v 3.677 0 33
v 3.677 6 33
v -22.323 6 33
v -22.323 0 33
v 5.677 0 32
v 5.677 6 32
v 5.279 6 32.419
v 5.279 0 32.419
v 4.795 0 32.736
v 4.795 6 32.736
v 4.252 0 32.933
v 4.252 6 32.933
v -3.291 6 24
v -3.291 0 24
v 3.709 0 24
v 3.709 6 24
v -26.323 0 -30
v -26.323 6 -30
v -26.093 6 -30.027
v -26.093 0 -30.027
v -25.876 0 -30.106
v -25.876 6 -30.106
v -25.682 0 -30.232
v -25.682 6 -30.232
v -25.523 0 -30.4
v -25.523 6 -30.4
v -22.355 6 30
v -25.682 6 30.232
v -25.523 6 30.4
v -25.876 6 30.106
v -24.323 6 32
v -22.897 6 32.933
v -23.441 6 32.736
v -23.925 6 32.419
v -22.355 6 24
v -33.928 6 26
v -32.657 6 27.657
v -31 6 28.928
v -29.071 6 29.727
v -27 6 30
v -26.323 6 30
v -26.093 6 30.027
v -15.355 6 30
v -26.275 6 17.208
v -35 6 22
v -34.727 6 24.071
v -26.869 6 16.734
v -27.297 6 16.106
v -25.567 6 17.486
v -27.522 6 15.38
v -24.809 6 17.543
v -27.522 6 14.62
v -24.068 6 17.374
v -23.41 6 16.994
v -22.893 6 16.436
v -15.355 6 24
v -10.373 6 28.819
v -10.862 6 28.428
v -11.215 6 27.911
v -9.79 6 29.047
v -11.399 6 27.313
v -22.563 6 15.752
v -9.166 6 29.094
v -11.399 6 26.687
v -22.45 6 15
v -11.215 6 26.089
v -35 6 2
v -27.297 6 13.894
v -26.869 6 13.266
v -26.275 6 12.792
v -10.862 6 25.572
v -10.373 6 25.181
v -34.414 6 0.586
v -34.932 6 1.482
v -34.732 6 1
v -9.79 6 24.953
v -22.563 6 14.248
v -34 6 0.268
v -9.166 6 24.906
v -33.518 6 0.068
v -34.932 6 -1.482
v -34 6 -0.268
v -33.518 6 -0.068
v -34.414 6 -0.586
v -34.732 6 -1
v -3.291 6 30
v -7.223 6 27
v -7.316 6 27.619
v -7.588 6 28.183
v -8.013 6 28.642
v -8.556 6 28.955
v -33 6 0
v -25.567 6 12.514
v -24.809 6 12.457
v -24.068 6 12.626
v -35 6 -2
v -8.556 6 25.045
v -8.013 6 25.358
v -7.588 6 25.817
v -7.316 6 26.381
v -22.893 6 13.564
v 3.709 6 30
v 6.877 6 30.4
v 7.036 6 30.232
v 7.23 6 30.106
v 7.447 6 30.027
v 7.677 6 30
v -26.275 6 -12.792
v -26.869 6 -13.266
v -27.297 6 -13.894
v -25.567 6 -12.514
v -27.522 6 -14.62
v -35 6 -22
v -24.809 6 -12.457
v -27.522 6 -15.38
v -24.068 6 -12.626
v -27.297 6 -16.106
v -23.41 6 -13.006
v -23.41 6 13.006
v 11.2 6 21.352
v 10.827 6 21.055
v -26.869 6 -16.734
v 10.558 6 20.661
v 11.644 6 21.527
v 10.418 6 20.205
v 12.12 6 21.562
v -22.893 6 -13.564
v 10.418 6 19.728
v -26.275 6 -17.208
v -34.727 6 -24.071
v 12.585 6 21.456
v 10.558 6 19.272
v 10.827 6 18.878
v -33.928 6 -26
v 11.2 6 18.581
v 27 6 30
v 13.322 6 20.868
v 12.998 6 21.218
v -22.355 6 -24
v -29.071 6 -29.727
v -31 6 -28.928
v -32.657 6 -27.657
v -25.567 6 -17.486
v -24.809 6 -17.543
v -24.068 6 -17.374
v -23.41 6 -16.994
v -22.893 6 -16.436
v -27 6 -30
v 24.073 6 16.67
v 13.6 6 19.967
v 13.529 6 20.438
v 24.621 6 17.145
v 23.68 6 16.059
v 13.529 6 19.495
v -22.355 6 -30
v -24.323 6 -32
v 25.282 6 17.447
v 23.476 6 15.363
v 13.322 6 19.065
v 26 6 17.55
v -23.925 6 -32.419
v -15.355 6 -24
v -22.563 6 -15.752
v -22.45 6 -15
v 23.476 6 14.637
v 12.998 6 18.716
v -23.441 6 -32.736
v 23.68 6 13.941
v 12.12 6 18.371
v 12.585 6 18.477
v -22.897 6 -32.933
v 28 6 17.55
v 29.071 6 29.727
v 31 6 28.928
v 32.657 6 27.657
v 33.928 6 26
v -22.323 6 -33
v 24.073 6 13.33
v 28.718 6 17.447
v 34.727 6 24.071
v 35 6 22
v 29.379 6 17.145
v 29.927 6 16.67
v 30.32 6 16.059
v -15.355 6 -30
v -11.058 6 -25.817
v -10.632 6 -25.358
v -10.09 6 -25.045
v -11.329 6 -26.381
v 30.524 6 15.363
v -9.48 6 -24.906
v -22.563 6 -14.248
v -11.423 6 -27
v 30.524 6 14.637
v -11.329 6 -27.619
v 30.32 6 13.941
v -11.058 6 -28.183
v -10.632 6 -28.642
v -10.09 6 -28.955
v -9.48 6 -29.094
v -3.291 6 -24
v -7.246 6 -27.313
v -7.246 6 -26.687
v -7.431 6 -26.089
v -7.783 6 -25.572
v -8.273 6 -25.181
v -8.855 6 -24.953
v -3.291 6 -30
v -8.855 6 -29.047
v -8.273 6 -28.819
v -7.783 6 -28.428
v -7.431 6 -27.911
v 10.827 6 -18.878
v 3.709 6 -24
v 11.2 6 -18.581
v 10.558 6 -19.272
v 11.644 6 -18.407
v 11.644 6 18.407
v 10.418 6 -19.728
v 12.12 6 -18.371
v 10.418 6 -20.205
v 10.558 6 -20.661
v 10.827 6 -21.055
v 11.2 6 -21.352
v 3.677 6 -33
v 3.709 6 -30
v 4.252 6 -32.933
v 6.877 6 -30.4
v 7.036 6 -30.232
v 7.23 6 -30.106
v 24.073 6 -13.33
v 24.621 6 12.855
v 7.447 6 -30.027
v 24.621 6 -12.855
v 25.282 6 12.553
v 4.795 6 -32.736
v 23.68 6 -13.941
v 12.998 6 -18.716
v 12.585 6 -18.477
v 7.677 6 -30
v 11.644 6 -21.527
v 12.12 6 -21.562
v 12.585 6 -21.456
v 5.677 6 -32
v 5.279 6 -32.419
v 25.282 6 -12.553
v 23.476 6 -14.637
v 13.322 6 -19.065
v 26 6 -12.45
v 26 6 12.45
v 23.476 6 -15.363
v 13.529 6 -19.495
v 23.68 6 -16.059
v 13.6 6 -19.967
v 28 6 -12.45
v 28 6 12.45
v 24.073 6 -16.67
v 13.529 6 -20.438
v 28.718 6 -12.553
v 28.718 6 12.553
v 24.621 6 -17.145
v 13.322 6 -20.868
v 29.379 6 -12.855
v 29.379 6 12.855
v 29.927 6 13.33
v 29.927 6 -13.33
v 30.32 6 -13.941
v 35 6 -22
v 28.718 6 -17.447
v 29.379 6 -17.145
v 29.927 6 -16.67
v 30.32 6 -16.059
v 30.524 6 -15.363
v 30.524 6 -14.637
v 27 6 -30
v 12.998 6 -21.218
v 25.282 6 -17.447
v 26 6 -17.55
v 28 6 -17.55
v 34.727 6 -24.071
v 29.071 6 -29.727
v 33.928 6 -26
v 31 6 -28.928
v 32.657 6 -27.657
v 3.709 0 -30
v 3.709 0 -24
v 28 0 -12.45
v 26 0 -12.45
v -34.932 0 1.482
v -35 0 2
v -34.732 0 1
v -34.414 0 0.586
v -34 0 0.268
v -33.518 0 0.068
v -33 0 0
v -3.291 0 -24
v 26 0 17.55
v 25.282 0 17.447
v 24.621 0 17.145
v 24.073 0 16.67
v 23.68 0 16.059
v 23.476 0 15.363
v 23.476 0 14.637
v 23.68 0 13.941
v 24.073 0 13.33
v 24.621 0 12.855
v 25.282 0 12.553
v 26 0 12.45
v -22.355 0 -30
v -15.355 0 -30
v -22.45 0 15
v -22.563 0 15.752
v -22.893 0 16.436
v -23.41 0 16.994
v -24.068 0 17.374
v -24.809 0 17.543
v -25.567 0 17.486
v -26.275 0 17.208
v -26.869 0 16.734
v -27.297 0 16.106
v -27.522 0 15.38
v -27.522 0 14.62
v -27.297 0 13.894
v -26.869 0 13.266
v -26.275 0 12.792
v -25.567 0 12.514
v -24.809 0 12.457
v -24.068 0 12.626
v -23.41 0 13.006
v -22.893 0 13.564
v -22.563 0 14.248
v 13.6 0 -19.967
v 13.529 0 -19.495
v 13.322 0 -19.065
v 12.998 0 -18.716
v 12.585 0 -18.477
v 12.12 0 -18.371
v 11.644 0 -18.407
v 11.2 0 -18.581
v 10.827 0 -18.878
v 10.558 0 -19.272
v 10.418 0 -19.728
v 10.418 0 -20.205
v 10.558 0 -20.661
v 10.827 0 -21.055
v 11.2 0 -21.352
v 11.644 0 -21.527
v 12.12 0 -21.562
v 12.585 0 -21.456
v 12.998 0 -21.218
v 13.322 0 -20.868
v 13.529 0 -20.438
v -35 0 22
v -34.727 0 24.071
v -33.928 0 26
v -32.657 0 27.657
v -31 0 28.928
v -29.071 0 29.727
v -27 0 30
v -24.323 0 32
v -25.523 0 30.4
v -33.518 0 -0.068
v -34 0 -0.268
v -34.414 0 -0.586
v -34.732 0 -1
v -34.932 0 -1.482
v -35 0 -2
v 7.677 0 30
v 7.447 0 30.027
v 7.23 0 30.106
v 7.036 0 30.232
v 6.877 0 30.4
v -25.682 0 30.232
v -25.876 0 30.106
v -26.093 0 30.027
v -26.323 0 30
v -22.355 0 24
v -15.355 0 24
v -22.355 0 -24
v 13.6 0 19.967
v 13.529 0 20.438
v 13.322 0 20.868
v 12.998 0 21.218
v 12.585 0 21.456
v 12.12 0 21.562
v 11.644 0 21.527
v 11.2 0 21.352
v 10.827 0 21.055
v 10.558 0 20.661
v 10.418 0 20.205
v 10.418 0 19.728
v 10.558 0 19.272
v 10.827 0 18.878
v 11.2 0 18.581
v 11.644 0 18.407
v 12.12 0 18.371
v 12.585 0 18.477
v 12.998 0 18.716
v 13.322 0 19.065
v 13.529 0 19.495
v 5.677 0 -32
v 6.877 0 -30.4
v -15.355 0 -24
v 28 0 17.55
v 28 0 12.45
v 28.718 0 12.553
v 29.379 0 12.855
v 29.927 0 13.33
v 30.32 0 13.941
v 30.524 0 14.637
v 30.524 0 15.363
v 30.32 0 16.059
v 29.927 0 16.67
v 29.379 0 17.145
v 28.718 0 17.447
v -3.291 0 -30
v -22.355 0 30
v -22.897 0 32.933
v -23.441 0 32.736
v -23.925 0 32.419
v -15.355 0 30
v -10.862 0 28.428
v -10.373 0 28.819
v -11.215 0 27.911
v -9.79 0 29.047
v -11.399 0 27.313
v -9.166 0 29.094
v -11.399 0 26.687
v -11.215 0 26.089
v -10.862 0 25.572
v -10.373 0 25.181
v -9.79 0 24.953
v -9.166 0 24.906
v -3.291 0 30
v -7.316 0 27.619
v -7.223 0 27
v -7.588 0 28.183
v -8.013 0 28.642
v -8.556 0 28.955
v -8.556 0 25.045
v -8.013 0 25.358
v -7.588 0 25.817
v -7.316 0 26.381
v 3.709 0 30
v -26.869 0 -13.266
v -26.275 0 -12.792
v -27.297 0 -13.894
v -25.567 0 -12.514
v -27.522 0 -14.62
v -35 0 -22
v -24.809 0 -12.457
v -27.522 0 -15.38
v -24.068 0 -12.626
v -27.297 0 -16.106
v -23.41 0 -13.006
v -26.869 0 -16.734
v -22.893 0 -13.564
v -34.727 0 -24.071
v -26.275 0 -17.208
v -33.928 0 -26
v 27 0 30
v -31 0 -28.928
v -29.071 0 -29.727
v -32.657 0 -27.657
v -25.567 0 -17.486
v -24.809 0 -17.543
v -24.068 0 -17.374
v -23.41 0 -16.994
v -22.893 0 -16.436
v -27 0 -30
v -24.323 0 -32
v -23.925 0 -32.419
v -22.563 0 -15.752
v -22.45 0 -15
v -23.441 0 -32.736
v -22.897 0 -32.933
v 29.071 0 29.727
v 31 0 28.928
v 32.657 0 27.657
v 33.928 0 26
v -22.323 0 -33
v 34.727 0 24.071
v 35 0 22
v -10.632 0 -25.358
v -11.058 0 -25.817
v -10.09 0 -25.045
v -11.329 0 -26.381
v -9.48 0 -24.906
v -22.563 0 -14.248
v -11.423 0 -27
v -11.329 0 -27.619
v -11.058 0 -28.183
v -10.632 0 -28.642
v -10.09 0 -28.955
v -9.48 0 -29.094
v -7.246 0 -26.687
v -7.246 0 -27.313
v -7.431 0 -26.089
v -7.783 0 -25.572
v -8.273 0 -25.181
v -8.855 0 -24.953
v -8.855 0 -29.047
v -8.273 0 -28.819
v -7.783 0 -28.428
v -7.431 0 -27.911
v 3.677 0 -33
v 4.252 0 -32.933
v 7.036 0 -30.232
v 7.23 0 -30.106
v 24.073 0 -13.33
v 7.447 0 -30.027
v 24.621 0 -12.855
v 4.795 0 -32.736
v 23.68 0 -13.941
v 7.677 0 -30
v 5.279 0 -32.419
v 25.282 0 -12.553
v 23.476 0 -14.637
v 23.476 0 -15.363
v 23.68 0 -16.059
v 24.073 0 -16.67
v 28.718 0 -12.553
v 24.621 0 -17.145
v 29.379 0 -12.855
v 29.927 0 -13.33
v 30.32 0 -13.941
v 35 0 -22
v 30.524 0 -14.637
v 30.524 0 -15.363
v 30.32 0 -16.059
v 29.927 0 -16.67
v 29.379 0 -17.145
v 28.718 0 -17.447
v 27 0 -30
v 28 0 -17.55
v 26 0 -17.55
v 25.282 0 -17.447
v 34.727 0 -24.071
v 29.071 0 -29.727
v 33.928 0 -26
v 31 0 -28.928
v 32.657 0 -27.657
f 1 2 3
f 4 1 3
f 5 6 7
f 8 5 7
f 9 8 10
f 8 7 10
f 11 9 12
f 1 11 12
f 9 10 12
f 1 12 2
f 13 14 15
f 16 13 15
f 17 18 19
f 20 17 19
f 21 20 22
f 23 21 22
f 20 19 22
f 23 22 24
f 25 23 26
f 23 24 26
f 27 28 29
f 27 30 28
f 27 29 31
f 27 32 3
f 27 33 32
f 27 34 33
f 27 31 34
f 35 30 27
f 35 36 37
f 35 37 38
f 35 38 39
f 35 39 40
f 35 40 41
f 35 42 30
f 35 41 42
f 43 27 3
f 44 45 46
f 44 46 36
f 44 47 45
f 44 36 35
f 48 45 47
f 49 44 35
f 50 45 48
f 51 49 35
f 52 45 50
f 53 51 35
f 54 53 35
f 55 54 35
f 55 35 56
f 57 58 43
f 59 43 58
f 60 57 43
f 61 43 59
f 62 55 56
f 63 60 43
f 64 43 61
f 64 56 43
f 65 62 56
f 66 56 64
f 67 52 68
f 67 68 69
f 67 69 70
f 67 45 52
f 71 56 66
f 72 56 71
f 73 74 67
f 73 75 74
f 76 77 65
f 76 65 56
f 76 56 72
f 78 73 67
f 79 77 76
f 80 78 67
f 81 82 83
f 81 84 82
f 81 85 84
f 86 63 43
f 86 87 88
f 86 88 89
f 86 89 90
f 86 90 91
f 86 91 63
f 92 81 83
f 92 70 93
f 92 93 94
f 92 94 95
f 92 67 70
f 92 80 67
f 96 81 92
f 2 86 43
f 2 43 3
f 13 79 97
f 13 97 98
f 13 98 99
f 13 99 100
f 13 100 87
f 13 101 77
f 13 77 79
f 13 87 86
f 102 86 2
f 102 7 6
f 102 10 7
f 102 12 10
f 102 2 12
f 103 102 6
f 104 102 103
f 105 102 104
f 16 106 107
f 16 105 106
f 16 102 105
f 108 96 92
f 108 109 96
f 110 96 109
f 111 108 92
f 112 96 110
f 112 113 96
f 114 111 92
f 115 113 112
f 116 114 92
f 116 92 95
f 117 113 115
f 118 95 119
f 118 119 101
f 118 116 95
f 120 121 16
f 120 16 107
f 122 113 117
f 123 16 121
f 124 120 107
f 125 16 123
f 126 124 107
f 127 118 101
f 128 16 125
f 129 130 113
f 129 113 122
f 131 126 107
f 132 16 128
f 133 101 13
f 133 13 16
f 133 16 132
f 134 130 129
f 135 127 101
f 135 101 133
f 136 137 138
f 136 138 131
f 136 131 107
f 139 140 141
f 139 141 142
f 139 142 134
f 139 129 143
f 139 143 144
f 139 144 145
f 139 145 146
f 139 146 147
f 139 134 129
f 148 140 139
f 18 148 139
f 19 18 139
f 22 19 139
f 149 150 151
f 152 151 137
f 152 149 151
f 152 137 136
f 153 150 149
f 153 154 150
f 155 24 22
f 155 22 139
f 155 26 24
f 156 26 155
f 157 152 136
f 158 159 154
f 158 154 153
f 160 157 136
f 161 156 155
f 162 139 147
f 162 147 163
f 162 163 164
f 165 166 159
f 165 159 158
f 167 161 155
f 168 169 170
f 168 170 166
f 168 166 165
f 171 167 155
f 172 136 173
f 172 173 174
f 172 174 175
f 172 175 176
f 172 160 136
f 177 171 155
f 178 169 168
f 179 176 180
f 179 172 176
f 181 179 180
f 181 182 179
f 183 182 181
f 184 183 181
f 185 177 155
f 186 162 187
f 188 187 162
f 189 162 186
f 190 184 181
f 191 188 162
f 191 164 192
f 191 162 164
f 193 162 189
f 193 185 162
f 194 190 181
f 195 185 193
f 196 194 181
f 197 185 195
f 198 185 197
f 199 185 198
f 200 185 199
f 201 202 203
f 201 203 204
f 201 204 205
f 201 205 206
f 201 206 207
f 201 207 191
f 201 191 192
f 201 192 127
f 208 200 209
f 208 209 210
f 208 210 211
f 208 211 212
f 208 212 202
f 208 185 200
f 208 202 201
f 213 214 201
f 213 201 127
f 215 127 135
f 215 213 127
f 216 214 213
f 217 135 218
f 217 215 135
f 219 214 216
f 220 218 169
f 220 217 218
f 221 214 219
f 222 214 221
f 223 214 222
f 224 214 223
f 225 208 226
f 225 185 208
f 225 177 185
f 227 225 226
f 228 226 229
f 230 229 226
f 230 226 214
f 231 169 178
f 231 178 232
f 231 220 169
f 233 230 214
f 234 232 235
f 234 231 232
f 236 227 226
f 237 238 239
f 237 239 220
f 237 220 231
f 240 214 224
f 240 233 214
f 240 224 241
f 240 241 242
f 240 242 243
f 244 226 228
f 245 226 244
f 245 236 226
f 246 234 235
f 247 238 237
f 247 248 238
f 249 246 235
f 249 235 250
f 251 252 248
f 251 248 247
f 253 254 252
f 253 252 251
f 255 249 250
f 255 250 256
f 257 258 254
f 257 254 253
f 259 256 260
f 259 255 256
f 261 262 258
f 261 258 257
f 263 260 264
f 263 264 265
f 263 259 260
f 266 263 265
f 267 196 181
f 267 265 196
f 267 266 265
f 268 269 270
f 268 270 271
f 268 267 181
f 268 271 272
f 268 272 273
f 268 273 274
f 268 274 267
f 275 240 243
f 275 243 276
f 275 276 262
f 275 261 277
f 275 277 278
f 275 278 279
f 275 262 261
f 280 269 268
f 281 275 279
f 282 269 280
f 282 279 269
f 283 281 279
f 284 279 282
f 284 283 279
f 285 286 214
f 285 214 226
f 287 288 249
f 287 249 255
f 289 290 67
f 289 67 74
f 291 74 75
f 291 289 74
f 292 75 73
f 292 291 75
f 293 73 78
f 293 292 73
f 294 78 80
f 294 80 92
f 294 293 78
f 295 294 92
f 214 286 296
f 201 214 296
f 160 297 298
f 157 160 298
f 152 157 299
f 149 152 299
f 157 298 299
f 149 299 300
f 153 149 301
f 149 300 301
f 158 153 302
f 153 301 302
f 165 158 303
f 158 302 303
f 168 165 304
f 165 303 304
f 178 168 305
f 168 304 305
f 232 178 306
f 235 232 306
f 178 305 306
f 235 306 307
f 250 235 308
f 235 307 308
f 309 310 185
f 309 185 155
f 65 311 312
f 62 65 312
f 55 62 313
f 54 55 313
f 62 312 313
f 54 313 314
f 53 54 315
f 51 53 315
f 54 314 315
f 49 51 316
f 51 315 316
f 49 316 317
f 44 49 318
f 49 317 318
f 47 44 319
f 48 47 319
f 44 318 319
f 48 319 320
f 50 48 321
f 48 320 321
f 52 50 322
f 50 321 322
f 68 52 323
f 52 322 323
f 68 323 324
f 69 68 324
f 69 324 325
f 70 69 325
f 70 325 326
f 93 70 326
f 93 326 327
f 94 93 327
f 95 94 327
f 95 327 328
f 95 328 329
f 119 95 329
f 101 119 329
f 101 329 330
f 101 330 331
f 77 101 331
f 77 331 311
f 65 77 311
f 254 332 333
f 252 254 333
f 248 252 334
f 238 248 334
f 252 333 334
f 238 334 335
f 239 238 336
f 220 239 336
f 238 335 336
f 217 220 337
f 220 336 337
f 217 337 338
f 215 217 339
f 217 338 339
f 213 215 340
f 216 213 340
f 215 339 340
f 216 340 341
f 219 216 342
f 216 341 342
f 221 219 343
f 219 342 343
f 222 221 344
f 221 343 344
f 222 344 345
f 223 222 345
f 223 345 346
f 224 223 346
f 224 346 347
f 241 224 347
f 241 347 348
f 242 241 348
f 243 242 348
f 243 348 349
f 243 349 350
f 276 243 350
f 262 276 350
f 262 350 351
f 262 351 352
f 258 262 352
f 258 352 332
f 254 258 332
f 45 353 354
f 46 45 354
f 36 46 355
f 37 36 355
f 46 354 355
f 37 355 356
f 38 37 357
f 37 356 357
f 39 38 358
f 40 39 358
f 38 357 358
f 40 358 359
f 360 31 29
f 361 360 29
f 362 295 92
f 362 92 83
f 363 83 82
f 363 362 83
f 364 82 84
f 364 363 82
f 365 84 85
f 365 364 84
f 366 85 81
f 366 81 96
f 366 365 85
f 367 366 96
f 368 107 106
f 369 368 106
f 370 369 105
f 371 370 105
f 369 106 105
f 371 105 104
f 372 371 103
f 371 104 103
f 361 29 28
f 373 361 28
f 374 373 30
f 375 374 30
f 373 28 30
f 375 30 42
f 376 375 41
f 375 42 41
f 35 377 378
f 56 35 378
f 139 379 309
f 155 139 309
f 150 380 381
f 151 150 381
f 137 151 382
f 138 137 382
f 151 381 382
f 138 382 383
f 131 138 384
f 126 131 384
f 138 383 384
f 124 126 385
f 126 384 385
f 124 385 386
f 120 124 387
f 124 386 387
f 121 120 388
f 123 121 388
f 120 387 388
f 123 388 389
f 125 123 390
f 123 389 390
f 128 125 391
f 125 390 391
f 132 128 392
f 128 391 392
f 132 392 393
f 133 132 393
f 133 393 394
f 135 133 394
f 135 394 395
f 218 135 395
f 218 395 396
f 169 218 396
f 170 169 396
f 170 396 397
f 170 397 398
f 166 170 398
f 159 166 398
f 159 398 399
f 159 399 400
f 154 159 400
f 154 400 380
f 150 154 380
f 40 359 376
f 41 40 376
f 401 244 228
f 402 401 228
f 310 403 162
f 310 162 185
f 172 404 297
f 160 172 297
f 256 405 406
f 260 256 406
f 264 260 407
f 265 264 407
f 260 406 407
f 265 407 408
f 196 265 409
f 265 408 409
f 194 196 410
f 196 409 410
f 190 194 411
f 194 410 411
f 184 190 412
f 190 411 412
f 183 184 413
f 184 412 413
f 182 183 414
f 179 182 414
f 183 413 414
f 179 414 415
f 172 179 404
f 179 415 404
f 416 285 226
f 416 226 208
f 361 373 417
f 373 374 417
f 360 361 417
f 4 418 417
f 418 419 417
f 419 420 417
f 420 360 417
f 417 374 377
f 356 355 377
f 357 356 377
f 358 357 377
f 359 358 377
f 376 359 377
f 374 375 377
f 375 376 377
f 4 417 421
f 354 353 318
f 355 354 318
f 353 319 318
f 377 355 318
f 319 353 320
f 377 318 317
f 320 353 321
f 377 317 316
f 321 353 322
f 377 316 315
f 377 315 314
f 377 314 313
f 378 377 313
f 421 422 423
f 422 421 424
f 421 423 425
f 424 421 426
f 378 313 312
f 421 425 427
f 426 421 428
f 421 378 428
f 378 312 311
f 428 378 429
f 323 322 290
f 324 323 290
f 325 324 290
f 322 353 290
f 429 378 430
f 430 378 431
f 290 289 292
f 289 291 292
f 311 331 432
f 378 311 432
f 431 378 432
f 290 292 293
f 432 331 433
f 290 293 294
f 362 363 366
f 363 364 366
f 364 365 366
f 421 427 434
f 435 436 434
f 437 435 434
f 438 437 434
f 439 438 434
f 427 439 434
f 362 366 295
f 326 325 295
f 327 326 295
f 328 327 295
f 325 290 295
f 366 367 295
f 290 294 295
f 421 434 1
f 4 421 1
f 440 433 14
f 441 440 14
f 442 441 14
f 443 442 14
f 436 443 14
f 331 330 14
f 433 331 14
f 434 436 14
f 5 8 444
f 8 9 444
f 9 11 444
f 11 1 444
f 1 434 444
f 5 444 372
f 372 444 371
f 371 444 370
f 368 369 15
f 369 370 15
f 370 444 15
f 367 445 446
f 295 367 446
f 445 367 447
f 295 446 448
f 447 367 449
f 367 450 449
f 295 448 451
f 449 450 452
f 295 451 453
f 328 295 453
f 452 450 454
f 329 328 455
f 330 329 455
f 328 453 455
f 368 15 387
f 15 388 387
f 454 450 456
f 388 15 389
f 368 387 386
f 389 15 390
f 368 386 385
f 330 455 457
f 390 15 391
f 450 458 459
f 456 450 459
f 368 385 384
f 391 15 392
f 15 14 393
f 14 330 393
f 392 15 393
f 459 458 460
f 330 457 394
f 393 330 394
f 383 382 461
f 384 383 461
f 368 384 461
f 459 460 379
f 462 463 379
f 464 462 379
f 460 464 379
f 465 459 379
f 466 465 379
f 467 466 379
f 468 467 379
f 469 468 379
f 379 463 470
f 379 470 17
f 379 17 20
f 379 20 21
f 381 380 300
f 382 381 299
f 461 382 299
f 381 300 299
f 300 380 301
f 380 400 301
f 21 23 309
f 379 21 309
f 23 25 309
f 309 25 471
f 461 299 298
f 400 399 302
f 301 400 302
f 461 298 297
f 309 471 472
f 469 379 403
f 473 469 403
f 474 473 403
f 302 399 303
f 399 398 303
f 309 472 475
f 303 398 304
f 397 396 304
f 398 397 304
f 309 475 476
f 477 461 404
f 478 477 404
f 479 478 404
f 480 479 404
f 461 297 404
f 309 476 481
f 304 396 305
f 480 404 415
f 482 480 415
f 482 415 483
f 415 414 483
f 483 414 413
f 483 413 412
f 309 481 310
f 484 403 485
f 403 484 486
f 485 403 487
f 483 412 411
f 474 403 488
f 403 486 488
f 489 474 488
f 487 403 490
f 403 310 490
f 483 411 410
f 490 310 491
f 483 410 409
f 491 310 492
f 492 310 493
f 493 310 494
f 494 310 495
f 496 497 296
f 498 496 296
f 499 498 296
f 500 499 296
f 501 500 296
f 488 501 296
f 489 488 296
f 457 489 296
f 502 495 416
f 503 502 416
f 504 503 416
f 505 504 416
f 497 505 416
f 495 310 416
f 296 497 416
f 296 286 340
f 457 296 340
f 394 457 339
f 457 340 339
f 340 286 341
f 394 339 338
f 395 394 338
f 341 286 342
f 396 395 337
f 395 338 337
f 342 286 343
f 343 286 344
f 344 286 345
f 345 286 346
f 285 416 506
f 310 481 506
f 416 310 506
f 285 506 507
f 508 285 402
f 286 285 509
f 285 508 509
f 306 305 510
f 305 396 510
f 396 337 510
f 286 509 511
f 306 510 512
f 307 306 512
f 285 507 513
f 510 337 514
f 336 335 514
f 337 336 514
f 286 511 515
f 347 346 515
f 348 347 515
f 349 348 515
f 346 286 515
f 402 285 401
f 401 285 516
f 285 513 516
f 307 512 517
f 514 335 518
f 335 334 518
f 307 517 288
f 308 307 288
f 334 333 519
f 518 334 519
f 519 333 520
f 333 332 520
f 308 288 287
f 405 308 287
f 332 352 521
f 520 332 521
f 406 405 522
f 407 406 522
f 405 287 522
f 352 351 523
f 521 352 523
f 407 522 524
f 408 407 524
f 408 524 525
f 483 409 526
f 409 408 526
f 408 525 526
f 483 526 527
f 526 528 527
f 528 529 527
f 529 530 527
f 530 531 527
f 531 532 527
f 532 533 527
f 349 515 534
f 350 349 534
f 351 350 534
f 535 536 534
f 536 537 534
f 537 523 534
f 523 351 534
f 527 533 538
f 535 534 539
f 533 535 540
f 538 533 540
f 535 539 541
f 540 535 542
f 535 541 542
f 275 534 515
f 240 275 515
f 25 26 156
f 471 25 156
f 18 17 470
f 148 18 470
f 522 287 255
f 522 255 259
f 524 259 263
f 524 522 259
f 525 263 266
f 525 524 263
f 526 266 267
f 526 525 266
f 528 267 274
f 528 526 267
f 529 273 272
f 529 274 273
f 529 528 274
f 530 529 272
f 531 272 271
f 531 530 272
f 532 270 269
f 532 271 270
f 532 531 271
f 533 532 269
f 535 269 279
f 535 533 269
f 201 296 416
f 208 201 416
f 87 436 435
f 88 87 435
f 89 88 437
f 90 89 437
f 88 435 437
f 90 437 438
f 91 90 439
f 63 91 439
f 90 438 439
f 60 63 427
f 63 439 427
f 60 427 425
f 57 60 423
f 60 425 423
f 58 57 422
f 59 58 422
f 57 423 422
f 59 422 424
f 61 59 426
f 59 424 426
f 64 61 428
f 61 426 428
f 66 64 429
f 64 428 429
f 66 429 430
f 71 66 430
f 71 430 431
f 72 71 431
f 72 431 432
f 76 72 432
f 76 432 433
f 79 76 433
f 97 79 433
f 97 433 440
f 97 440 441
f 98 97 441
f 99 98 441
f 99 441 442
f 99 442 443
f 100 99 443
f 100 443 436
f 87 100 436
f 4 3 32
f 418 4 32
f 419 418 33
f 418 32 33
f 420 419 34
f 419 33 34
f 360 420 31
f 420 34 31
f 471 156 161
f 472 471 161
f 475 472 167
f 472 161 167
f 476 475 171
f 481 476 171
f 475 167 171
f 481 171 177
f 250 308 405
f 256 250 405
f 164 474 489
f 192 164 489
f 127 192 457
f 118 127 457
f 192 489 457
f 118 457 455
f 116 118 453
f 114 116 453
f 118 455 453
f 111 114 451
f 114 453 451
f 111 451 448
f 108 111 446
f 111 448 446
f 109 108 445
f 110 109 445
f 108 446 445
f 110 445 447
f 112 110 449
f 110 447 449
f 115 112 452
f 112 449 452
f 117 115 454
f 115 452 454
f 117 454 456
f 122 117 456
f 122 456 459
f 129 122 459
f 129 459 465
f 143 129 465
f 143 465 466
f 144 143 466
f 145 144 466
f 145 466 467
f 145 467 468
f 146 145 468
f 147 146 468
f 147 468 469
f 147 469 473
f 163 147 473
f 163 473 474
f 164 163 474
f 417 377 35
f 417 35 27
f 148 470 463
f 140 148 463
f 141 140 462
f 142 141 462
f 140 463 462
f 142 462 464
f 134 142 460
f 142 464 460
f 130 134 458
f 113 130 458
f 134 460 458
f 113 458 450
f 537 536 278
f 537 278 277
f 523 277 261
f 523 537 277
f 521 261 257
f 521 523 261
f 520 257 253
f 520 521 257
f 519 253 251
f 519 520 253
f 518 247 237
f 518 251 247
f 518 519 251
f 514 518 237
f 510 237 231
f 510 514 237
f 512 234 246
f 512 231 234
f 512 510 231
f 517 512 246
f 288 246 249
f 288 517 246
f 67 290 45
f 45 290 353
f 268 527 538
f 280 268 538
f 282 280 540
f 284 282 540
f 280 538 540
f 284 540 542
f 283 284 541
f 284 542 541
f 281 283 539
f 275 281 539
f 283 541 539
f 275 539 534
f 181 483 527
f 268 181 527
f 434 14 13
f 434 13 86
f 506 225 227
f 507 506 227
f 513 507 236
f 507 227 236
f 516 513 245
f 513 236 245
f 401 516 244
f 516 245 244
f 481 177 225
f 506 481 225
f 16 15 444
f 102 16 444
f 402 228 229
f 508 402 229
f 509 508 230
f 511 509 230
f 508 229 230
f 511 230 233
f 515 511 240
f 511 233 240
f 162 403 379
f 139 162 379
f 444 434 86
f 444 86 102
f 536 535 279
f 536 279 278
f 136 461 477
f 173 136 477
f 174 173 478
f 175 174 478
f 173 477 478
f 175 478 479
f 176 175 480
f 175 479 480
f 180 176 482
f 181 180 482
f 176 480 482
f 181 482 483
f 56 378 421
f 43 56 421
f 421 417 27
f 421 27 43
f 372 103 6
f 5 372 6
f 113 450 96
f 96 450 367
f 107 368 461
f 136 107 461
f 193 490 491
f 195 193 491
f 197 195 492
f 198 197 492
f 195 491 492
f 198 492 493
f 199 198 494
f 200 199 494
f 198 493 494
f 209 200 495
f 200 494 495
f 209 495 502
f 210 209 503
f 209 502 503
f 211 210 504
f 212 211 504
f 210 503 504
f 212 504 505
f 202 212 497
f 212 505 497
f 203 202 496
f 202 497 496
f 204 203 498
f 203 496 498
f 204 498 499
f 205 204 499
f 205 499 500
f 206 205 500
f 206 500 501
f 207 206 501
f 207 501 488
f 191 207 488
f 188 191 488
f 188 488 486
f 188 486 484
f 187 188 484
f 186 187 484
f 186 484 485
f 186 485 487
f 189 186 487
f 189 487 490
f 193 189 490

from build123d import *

# Parameters (mm, degrees)
EXTRUDE_1_DEPTH      = 6
SKETCH_2_R           = 2.55
SKETCH_2_R_2         = 1.6
CUT_EXTRUDE_1_DEPTH  = 7
CUT_EXTRUDE_2_DEPTH  = 7
EXTRUDE_2_DEPTH      = 6
SKETCH_31_R          = 2.1
SKETCH_31_W          = 7
SKETCH_31_H          = 6
CUT_EXTRUDE_11_DEPTH = 7
EXTRUDE_21_DEPTH     = 6
SKETCH_33_R          = 2.1
SKETCH_33_W          = 7
SKETCH_33_H          = 6
CUT_EXTRUDE_13_DEPTH = 7


with BuildPart() as part:
    # Эскиз1 → Бобышка-Вытянуть1 (new body)
    with BuildSketch(Plane(origin=(0, 0, 0), x_dir=(1, 0, 0), z_dir=(0, 1, 0))):
        with BuildLine():
            Line((-27, -30), (27, -30))
            ThreePointArc((27, -30), (32.656854249, -27.656854249), (35, -22))
            Line((35, -22), (35, 22))
            ThreePointArc((35, 22), (32.656854249, 27.656854249), (27, 30))
            Line((27, 30), (-27, 30))
            ThreePointArc((-27, 30), (-32.656854249, 27.656854249), (-35, 22))
            Line((-35, 22), (-35, -22))
            ThreePointArc((-35, -22), (-32.656854249, -27.656854249), (-27, -30))
        make_face()
    extrude(amount=EXTRUDE_1_DEPTH)

    # Эскиз2 → Вырез-Вытянуть1 (cut, through all)
    with BuildSketch(Plane.XZ):
        with Locations((-25, -15)):
            Circle(SKETCH_2_R)
        with Locations((-25, 15)):
            Circle(SKETCH_2_R)
        with Locations((12, 19.966651117)):
            Circle(SKETCH_2_R_2)
        with Locations((12, -19.966651117)):
            Circle(SKETCH_2_R_2)
        with BuildLine():
            Line((28, -17.55), (26, -17.55))
            ThreePointArc((26, -17.55), (23.45, -15), (26, -12.45))
            Line((26, -12.45), (28, -12.45))
            ThreePointArc((28, -12.45), (30.55, -15), (28, -17.55))
        make_face()
        with BuildLine():
            Line((28, 17.55), (26, 17.55))
            ThreePointArc((26, 17.55), (23.45, 15), (26, 12.45))
            Line((26, 12.45), (28, 12.45))
            ThreePointArc((28, 12.45), (30.55, 15), (28, 17.55))
        make_face()
    extrude(amount=-CUT_EXTRUDE_1_DEPTH, mode=Mode.SUBTRACT)

    # Эскиз3 → Вырез-Вытянуть2 (cut, through all)
    with BuildSketch(Plane.XZ):
        with BuildLine():
            Line((-35, -2), (-35, 2))
            ThreePointArc((-35, 2), (-34.414213562, 0.585786438), (-33, 0))
            ThreePointArc((-33, 0), (-34.414213562, -0.585786438), (-35, -2))
        make_face()
    extrude(amount=-CUT_EXTRUDE_2_DEPTH, mode=Mode.SUBTRACT)

    # Эскиз21 → Бобышка-Вытянуть2 (add)
    with BuildSketch(Plane(origin=(-9.322772353, 6, 20), x_dir=(-1, 0, 0), z_dir=(0, -1, 0))):
        with BuildLine():
            Line((13, 53), (-13, 53))
            ThreePointArc((-13, 53), (-14.118033989, 52.736067977), (-15, 52))
            Line((-15, 52), (-16.2, 50.4))
            ThreePointArc((-16.2, 50.4), (-16.552786405, 50.105572809), (-17, 50))
            Line((-17, 50), (17, 50))
            ThreePointArc((17, 50), (16.552786405, 50.105572809), (16.2, 50.4))
            Line((16.2, 50.4), (15, 52))
            ThreePointArc((15, 52), (14.118033989, 52.736067977), (13, 53))
        make_face()
    extrude(amount=EXTRUDE_2_DEPTH)

    # Эскиз31 → Вырез-Вытянуть11 (cut, through all)
    with BuildSketch(Plane(origin=(-9.322772353, 0, 20), x_dir=(-1, 0, 0), z_dir=(0, -1, 0))):
        with Locations((0, 47)):
            Circle(SKETCH_31_R)
        with Locations((9.531849908, 47)):
            Rectangle(SKETCH_31_W, SKETCH_31_H)
        with Locations((-9.531849908, 47)):
            Rectangle(SKETCH_31_W, SKETCH_31_H)
    extrude(amount=-CUT_EXTRUDE_11_DEPTH, mode=Mode.SUBTRACT)

    # Эскиз22 → Бобышка-Вытянуть21 (add)
    with BuildSketch(Plane(origin=(-9.322772353, 6, -20), x_dir=(1, 0, 0), z_dir=(0, -1, 0))):
        with BuildLine():
            Line((13, 53), (-13, 53))
            ThreePointArc((-13, 53), (-14.118033989, 52.736067977), (-15, 52))
            Line((-15, 52), (-16.2, 50.4))
            ThreePointArc((-16.2, 50.4), (-16.552786405, 50.105572809), (-17, 50))
            Line((-17, 50), (17, 50))
            ThreePointArc((17, 50), (16.552786405, 50.105572809), (16.2, 50.4))
            Line((16.2, 50.4), (15, 52))
            ThreePointArc((15, 52), (14.118033989, 52.736067977), (13, 53))
        make_face()
    extrude(amount=EXTRUDE_21_DEPTH)

    # Эскиз33 → Вырез-Вытянуть13 (cut, through all)
    with BuildSketch(Plane(origin=(-9.322772353, 0, -20), x_dir=(1, 0, 0), z_dir=(0, -1, 0))):
        with Locations((0, 47)):
            Circle(SKETCH_33_R)
        with Locations((9.531849908, 47)):
            Rectangle(SKETCH_33_W, SKETCH_33_H)
        with Locations((-9.531849908, 47)):
            Rectangle(SKETCH_33_W, SKETCH_33_H)
    extrude(amount=-CUT_EXTRUDE_13_DEPTH, mode=Mode.SUBTRACT)


solid = part.part
